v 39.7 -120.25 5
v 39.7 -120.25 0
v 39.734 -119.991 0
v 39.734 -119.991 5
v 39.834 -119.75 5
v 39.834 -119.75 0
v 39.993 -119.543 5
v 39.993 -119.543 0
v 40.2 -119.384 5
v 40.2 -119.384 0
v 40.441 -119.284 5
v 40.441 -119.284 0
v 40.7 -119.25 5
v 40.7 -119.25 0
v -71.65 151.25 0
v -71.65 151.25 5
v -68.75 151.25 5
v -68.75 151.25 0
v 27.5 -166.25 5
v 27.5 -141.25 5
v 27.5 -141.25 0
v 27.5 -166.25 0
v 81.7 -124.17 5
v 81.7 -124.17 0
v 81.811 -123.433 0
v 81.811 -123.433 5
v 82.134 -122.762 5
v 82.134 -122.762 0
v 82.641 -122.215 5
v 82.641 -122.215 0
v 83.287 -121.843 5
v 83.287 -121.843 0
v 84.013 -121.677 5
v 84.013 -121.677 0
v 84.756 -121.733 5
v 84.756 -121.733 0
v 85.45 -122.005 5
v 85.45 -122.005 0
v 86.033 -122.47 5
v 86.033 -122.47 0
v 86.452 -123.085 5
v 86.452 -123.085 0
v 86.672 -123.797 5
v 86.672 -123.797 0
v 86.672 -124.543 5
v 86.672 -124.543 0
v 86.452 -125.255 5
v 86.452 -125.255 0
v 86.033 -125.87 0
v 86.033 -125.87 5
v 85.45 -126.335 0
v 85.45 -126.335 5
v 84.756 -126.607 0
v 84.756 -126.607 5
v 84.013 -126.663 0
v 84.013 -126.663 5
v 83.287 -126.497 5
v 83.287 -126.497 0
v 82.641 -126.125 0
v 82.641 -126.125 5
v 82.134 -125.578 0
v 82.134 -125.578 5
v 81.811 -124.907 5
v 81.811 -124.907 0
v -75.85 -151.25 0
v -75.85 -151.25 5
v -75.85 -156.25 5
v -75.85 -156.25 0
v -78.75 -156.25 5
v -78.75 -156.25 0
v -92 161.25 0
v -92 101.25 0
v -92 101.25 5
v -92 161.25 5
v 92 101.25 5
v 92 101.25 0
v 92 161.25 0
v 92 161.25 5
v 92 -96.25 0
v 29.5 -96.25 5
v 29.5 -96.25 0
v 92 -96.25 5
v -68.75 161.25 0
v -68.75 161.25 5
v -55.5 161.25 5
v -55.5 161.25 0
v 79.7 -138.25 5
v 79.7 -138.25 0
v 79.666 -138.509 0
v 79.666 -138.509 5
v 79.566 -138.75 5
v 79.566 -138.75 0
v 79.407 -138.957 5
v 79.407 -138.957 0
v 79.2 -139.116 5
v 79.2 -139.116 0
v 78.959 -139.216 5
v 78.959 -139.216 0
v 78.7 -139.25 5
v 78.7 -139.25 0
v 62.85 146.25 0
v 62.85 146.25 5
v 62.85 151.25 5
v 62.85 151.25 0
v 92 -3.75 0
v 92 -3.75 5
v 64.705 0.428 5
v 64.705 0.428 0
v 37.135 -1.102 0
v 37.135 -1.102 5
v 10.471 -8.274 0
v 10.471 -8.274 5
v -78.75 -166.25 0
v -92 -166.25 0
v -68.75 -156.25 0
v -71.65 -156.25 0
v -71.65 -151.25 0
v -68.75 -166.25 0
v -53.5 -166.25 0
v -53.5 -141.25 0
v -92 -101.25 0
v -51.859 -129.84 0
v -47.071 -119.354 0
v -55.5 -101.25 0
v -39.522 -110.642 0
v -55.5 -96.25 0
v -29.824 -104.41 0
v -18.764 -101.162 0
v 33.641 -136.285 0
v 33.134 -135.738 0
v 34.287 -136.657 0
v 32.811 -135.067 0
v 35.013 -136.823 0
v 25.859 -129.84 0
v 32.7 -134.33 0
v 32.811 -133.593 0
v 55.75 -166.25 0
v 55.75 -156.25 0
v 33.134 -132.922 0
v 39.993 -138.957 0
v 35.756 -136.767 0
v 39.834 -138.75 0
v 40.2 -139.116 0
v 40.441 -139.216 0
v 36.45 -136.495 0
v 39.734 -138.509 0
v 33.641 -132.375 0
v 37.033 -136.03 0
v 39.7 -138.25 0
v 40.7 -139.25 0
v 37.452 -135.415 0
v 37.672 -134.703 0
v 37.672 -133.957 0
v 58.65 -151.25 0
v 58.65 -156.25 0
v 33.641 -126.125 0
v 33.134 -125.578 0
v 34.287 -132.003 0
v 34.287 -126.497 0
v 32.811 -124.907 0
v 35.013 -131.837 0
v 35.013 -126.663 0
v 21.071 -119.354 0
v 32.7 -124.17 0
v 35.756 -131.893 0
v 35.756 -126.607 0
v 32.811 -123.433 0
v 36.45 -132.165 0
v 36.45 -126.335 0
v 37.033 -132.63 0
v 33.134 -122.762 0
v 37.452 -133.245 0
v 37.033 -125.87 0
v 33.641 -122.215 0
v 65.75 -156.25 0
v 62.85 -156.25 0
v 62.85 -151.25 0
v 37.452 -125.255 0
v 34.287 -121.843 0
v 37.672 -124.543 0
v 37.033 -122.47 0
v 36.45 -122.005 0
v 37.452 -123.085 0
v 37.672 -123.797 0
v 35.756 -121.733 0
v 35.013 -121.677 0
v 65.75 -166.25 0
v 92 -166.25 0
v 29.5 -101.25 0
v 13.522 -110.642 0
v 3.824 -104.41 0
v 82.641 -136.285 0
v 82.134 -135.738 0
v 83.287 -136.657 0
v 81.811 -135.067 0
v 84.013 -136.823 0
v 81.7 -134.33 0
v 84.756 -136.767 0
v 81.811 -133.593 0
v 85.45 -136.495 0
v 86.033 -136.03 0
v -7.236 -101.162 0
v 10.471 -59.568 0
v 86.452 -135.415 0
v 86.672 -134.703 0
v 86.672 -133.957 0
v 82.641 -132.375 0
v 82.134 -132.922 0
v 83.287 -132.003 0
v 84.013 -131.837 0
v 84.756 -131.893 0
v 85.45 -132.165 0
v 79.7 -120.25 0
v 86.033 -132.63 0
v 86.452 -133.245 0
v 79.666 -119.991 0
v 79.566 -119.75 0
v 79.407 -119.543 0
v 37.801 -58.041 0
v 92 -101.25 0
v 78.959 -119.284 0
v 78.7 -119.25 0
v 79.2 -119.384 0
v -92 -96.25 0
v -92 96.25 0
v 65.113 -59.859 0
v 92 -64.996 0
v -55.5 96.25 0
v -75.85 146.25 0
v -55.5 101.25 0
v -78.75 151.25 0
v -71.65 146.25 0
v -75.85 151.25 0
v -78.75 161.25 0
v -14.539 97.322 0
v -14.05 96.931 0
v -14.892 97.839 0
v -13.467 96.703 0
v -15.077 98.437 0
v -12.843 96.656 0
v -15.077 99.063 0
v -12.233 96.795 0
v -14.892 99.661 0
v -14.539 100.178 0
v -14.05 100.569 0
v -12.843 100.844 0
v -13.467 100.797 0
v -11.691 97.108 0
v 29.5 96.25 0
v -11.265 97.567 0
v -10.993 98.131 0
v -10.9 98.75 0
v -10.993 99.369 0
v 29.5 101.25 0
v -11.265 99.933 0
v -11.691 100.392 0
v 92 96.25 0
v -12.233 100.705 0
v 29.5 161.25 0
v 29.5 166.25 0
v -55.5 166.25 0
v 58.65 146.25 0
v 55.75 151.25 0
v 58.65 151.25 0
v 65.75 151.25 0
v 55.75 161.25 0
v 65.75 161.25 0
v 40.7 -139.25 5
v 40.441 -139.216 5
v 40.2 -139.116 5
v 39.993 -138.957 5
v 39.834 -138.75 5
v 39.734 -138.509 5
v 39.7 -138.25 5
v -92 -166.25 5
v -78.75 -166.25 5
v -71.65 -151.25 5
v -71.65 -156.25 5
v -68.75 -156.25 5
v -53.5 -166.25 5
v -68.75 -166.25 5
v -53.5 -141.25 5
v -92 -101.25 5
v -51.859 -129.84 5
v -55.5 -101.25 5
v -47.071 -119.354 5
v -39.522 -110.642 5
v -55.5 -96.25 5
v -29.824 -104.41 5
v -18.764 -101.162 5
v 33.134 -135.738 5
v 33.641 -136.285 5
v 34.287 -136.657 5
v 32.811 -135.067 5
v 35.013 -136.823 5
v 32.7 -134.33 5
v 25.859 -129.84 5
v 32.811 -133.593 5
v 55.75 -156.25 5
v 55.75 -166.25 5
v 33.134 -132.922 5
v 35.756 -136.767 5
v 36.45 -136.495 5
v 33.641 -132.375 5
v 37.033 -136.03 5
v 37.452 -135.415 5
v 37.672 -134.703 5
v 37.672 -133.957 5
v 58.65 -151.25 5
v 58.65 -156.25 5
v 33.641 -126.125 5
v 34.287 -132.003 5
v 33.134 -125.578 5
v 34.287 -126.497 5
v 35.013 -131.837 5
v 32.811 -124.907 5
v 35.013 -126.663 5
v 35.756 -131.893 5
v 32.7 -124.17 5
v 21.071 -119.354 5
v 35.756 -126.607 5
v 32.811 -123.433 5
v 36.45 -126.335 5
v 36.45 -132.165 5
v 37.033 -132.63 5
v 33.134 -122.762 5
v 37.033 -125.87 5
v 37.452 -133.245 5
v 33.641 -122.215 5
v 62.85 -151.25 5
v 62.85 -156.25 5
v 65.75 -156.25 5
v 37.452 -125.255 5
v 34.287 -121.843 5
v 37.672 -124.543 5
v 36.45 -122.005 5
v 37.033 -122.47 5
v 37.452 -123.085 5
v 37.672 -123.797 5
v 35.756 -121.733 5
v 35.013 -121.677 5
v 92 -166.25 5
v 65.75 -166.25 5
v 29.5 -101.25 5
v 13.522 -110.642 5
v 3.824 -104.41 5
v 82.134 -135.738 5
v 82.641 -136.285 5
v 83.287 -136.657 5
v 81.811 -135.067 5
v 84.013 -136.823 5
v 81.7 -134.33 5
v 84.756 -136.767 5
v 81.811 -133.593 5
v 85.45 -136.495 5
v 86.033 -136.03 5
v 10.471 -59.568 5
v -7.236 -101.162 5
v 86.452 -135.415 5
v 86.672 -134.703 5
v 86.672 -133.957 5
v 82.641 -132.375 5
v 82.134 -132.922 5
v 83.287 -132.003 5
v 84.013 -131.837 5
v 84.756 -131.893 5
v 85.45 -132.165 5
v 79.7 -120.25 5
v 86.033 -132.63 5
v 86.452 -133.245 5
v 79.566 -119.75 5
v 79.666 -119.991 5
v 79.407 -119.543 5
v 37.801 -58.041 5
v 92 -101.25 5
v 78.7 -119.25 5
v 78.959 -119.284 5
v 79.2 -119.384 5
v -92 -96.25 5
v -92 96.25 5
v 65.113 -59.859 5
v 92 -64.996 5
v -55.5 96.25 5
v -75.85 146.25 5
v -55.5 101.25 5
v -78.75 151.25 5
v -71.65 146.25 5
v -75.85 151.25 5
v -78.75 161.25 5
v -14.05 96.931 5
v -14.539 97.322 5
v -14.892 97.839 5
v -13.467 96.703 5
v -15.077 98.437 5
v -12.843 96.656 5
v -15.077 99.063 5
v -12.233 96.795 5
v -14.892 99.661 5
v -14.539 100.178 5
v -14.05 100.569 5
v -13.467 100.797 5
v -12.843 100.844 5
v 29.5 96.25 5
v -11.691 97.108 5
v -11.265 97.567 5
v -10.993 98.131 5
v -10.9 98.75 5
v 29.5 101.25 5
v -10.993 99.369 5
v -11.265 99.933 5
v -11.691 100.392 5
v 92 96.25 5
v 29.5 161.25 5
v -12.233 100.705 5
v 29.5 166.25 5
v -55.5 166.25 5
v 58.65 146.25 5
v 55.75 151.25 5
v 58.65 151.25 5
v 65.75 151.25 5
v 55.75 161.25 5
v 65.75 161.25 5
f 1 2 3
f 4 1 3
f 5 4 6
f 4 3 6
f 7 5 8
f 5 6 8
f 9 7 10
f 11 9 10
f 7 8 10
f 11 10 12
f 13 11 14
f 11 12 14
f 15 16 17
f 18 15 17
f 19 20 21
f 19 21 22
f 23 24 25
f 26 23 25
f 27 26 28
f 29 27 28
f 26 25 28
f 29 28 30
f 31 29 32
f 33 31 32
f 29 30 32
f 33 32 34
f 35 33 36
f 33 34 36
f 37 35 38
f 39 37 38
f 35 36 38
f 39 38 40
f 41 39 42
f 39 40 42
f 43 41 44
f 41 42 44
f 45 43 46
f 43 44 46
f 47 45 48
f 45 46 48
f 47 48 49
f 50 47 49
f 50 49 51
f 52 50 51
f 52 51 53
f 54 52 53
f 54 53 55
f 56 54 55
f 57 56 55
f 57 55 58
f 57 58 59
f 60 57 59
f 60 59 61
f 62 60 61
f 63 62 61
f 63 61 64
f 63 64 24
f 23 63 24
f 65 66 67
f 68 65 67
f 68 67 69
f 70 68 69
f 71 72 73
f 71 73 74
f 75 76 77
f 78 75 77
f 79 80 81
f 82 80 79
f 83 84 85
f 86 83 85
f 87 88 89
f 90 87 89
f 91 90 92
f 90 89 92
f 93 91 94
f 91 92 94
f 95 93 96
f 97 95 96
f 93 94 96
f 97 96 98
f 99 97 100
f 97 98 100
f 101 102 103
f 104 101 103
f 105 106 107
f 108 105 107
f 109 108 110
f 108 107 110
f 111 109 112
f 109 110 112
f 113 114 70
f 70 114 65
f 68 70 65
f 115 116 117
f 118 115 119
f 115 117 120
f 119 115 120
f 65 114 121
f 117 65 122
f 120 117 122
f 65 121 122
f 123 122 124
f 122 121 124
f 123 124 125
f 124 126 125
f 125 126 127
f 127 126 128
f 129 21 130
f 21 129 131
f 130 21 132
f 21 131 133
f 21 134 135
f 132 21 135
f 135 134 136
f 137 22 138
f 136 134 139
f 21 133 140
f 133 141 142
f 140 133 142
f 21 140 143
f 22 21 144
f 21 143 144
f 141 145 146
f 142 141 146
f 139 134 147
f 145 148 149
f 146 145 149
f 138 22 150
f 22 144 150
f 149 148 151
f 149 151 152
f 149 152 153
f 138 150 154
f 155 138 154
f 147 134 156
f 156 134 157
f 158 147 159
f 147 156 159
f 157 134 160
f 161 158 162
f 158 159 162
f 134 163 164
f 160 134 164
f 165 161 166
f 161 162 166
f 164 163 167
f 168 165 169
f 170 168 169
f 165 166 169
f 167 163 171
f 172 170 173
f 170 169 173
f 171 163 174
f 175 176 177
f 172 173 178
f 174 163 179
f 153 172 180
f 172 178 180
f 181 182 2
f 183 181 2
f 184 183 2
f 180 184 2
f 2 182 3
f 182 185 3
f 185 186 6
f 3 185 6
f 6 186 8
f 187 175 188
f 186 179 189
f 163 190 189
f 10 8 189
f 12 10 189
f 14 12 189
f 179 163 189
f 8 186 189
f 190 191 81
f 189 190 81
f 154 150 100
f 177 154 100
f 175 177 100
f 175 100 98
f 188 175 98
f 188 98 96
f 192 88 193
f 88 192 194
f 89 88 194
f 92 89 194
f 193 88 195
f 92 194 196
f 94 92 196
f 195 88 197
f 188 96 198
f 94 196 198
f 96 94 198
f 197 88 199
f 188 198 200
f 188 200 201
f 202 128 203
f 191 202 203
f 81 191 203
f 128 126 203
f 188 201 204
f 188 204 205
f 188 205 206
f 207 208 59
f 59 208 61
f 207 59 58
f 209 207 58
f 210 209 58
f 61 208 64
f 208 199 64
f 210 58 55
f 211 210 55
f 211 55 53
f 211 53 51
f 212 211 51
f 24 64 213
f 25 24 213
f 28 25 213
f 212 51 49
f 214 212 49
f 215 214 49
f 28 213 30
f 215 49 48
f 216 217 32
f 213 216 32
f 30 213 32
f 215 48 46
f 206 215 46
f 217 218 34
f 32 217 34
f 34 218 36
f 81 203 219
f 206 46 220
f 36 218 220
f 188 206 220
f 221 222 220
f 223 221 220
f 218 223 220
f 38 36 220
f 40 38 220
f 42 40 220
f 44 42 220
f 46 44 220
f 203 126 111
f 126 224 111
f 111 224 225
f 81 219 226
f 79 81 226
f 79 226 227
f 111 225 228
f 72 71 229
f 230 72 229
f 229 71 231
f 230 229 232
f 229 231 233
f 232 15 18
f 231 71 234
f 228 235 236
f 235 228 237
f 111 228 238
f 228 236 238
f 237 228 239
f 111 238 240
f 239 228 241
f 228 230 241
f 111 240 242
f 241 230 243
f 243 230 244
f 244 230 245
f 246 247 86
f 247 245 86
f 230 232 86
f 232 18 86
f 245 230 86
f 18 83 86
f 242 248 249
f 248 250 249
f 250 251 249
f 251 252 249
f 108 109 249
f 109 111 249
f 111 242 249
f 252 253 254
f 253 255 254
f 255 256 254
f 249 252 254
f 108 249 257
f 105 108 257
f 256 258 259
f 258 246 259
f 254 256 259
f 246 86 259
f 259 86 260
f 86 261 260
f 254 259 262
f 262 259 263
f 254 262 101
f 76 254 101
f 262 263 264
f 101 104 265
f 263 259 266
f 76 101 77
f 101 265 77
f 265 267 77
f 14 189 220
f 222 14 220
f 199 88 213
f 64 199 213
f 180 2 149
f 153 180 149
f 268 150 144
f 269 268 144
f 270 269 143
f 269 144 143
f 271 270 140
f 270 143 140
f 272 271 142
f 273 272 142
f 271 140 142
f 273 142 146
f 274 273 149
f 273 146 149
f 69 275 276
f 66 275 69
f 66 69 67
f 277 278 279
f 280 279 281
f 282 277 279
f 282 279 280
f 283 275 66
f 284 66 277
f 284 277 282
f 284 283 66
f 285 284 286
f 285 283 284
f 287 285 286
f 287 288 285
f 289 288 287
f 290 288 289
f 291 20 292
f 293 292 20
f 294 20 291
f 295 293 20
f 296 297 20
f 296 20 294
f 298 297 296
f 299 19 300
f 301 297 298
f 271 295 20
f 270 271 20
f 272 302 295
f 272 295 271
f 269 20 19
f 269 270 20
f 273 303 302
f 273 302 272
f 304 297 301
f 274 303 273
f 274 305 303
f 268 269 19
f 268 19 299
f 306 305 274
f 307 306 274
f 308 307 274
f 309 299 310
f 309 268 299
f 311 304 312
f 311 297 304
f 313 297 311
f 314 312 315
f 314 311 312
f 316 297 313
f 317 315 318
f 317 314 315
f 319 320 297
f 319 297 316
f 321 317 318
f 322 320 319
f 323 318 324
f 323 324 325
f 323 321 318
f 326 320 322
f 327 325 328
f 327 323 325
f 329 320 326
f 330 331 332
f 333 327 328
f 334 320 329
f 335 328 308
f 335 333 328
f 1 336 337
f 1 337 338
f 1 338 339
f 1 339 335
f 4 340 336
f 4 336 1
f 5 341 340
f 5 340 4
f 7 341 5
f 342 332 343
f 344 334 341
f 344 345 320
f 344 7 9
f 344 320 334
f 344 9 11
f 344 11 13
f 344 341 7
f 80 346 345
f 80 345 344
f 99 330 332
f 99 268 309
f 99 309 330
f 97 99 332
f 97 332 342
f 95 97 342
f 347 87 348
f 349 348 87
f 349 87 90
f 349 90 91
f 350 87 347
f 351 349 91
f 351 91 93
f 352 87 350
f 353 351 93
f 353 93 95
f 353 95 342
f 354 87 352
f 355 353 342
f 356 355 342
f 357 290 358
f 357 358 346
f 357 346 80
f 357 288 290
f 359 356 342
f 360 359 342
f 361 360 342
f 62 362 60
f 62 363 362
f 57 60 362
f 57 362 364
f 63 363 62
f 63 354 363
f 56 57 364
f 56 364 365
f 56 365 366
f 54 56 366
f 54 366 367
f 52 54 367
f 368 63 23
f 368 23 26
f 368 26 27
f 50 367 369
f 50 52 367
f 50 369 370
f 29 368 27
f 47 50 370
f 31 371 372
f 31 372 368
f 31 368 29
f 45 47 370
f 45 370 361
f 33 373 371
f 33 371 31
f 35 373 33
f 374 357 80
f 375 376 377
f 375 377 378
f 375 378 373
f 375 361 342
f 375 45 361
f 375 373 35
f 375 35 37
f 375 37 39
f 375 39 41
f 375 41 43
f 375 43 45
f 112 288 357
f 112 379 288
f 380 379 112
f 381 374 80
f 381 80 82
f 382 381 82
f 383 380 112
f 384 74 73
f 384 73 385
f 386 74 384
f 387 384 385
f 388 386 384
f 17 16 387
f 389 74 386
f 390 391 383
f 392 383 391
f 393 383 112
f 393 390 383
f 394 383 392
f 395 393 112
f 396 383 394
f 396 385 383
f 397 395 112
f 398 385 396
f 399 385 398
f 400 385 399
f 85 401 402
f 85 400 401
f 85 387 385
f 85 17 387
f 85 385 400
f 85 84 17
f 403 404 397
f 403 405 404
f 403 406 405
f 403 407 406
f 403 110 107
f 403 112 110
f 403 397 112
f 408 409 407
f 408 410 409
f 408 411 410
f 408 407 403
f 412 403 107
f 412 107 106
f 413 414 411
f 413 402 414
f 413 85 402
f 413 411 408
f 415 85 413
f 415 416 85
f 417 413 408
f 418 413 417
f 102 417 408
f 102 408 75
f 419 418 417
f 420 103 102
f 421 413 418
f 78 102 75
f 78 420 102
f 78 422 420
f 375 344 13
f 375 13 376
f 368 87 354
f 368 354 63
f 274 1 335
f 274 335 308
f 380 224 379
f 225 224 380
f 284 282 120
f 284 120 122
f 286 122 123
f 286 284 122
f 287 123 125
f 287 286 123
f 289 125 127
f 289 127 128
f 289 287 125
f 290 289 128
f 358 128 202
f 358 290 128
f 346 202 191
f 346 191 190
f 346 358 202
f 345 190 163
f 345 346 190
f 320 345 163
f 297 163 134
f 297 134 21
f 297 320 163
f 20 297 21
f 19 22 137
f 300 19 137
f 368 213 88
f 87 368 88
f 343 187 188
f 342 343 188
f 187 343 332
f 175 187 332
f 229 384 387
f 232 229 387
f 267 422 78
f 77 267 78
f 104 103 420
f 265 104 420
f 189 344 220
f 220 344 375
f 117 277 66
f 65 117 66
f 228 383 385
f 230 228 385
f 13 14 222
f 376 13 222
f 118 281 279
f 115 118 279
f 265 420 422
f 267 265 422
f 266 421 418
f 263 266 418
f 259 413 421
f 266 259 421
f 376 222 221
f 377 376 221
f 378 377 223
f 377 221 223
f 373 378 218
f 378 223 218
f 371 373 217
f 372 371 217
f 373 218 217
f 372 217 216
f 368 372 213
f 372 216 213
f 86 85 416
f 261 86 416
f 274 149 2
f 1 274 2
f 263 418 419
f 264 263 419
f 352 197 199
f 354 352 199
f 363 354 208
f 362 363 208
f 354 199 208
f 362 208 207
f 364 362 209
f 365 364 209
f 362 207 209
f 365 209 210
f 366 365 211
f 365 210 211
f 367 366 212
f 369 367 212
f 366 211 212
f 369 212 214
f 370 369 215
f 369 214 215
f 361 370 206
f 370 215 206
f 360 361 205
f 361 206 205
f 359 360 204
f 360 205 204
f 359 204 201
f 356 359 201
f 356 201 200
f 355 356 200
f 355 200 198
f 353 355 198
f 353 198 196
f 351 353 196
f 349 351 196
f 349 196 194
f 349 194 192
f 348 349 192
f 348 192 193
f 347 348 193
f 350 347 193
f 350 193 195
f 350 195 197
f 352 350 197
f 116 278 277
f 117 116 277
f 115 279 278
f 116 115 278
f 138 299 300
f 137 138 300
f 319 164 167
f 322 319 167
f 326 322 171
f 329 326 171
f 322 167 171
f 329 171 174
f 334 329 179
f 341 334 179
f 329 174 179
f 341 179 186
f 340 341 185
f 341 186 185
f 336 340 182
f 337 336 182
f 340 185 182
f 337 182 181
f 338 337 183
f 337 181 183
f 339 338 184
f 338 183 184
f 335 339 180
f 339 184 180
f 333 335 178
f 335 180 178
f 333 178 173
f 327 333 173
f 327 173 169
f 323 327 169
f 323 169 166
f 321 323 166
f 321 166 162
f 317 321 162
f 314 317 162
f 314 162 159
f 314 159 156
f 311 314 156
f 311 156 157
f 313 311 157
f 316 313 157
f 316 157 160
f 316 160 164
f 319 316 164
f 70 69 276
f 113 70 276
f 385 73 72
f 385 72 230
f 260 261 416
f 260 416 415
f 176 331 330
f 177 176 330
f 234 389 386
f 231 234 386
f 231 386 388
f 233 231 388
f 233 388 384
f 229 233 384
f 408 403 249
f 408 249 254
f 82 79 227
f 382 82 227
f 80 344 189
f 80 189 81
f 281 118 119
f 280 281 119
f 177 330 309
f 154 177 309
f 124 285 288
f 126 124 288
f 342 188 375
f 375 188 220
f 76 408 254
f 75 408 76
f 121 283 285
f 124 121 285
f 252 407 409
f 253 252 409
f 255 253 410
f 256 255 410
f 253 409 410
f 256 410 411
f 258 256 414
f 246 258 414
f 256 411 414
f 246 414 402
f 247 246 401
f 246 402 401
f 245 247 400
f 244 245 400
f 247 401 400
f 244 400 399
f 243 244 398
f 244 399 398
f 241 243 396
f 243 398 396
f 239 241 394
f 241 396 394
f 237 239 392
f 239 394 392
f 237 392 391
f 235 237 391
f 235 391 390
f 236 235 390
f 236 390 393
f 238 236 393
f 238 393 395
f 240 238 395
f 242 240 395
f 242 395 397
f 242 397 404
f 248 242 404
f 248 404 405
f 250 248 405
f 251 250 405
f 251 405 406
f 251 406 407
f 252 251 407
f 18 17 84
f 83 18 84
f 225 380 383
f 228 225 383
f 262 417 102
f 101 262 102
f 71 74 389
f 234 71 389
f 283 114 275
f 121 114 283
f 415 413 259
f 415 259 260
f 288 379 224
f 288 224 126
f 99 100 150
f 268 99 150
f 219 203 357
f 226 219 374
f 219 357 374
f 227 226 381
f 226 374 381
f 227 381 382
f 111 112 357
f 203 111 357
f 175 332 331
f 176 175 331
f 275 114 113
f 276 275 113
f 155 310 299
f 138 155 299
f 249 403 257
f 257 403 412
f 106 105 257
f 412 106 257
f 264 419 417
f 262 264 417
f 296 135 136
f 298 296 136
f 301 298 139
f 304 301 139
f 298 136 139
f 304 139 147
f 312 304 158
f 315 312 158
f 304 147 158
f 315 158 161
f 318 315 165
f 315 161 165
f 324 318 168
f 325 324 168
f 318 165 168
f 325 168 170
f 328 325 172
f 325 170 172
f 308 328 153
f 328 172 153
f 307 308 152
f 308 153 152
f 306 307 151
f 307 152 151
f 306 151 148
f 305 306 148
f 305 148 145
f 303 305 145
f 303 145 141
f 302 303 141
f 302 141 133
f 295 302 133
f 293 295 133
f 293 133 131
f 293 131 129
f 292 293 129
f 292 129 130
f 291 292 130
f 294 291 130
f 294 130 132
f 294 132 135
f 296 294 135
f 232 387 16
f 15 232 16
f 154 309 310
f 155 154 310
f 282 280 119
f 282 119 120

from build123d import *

# Parameters (mm, degrees)
SKETCH2_W               = 184
SKETCH2_H               = 332.5
BOSS_EXTRUDE1_DEPTH     = 5
SKETCH3_W               = 36.5
SKETCH3_H               = 5
SKETCH3_W_2             = 62.5
CUT_EXTRUDE1_DEPTH      = 5
CUT_EXTRUDE2_DEPTH      = 10
SKETCH5_R               = 2.1
CUT_EXTRUDE3_DEPTH      = 10
ESQUISSE1_R             = 2.5
ENL_V_MAT_EXTRU_1_DEPTH = 10
ENL_V_MAT_EXTRU_2_DEPTH = 10


with BuildPart() as part:
    # Sketch2 → Boss-Extrude1 (new body)
    with BuildSketch(Plane.XY):
        Rectangle(SKETCH2_W, SKETCH2_H)
    extrude(amount=BOSS_EXTRUDE1_DEPTH)

    # Sketch3 → Cut-Extrude1 (cut)
    with BuildSketch(Plane.XY.offset(5)):
        with Locations((-73.75, -98.75)):
            Rectangle(SKETCH3_W, SKETCH3_H)
        with Locations((60.75, -98.75)):
            Rectangle(SKETCH3_W_2, SKETCH3_H)
        with Locations((-73.75, 163.75)):
            Rectangle(SKETCH3_W, SKETCH3_H)
        with Locations((60.75, 163.75)):
            Rectangle(SKETCH3_W_2, SKETCH3_H)
        with Locations((60.75, 98.75)):
            Rectangle(SKETCH3_W_2, SKETCH3_H)
        with BuildLine():
            Line((27.5, -141.25), (27.5, -166.25))
            Line((27.5, -166.25), (-53.5, -166.25))
            Line((-53.5, -166.25), (-53.5, -141.25))
            ThreePointArc((-53.5, -141.25), (-13, -100.75), (27.5, -141.25))
        make_face()
        with Locations((-73.75, 98.75)):
            Rectangle(SKETCH3_W, SKETCH3_H)
    extrude(amount=-CUT_EXTRUDE1_DEPTH, mode=Mode.SUBTRACT)

    # Sketch4 → Cut-Extrude2 (cut)
    with BuildSketch(Plane.XY.offset(5)):
        Polygon((55.75, 161.25), (55.75, 151.25), (58.65, 151.25), (58.65, 146.25), (62.85, 146.25), (62.85, 151.25), (65.75, 151.25), (65.75, 161.25), align=None)
        Polygon((-78.75, 161.25), (-78.75, 151.25), (-75.85, 151.25), (-75.85, 146.25), (-71.65, 146.25), (-71.65, 151.25), (-68.75, 151.25), (-68.75, 161.25), align=None)
        Polygon((65.75, -166.25), (65.75, -156.25), (62.85, -156.25), (62.85, -151.25), (58.65, -151.25), (58.65, -156.25), (55.75, -156.25), (55.75, -166.25), align=None)
        Polygon((-68.75, -166.25), (-68.75, -156.25), (-71.65, -156.25), (-71.65, -151.25), (-75.85, -151.25), (-75.85, -156.25), (-78.75, -156.25), (-78.75, -166.25), align=None)
    extrude(amount=-CUT_EXTRUDE2_DEPTH, mode=Mode.SUBTRACT)

    # Sketch5 → Cut-Extrude3 (cut)
    with BuildSketch(Plane.XY.offset(5)):
        with Locations((-13, 98.75)):
            Circle(SKETCH5_R)
    extrude(amount=-CUT_EXTRUDE3_DEPTH, mode=Mode.SUBTRACT)

    # Esquisse1 → Enlèv. mat.-Extru.1 (cut)
    with BuildSketch(Plane(origin=(0, 0, 0), x_dir=(-1, 0, 0), z_dir=(0, 0, -1))):
        with Locations((-35.2, -134.33)):
            Circle(ESQUISSE1_R)
        with Locations((-35.2, -124.17)):
            Circle(ESQUISSE1_R)
        with Locations((-84.2, -134.33)):
            Circle(ESQUISSE1_R)
        with Locations((-84.2, -124.17)):
            Circle(ESQUISSE1_R)
        with BuildLine():
            Line((-40.7, -119.25), (-78.7, -119.25))
            ThreePointArc((-78.7, -119.25), (-79.407106781, -119.542893219), (-79.7, -120.25))
            Line((-79.7, -120.25), (-79.7, -138.25))
            ThreePointArc((-79.7, -138.25), (-79.407106781, -138.957106781), (-78.7, -139.25))
            Line((-78.7, -139.25), (-40.7, -139.25))
            ThreePointArc((-40.7, -139.25), (-39.992893219, -138.957106781), (-39.7, -138.25))
            Line((-39.7, -138.25), (-39.7, -120.25))
            ThreePointArc((-39.7, -120.25), (-39.992893219, -119.542893219), (-40.7, -119.25))
        make_face()
    extrude(amount=-ENL_V_MAT_EXTRU_1_DEPTH, mode=Mode.SUBTRACT)

    # Esquisse2 → Enlèv. mat.-Extru.2 (cut)
    with BuildSketch(Plane.XY.offset(5)):
        with BuildLine():
            Line((10.470660362, -8.273773364), (10.470660362, -59.567669296))
            ThreePointArc((10.470660362, -59.567669296), (51.484945295, -58.532619163), (92, -64.995841242))
            Line((92, -64.995841242), (92, -3.75037767))
            ThreePointArc((92, -3.75037767), (50.880784547, 0.378228003), (10.470660362, -8.273773364))
        make_face()
    extrude(amount=-ENL_V_MAT_EXTRU_2_DEPTH, mode=Mode.SUBTRACT)


solid = part.part
